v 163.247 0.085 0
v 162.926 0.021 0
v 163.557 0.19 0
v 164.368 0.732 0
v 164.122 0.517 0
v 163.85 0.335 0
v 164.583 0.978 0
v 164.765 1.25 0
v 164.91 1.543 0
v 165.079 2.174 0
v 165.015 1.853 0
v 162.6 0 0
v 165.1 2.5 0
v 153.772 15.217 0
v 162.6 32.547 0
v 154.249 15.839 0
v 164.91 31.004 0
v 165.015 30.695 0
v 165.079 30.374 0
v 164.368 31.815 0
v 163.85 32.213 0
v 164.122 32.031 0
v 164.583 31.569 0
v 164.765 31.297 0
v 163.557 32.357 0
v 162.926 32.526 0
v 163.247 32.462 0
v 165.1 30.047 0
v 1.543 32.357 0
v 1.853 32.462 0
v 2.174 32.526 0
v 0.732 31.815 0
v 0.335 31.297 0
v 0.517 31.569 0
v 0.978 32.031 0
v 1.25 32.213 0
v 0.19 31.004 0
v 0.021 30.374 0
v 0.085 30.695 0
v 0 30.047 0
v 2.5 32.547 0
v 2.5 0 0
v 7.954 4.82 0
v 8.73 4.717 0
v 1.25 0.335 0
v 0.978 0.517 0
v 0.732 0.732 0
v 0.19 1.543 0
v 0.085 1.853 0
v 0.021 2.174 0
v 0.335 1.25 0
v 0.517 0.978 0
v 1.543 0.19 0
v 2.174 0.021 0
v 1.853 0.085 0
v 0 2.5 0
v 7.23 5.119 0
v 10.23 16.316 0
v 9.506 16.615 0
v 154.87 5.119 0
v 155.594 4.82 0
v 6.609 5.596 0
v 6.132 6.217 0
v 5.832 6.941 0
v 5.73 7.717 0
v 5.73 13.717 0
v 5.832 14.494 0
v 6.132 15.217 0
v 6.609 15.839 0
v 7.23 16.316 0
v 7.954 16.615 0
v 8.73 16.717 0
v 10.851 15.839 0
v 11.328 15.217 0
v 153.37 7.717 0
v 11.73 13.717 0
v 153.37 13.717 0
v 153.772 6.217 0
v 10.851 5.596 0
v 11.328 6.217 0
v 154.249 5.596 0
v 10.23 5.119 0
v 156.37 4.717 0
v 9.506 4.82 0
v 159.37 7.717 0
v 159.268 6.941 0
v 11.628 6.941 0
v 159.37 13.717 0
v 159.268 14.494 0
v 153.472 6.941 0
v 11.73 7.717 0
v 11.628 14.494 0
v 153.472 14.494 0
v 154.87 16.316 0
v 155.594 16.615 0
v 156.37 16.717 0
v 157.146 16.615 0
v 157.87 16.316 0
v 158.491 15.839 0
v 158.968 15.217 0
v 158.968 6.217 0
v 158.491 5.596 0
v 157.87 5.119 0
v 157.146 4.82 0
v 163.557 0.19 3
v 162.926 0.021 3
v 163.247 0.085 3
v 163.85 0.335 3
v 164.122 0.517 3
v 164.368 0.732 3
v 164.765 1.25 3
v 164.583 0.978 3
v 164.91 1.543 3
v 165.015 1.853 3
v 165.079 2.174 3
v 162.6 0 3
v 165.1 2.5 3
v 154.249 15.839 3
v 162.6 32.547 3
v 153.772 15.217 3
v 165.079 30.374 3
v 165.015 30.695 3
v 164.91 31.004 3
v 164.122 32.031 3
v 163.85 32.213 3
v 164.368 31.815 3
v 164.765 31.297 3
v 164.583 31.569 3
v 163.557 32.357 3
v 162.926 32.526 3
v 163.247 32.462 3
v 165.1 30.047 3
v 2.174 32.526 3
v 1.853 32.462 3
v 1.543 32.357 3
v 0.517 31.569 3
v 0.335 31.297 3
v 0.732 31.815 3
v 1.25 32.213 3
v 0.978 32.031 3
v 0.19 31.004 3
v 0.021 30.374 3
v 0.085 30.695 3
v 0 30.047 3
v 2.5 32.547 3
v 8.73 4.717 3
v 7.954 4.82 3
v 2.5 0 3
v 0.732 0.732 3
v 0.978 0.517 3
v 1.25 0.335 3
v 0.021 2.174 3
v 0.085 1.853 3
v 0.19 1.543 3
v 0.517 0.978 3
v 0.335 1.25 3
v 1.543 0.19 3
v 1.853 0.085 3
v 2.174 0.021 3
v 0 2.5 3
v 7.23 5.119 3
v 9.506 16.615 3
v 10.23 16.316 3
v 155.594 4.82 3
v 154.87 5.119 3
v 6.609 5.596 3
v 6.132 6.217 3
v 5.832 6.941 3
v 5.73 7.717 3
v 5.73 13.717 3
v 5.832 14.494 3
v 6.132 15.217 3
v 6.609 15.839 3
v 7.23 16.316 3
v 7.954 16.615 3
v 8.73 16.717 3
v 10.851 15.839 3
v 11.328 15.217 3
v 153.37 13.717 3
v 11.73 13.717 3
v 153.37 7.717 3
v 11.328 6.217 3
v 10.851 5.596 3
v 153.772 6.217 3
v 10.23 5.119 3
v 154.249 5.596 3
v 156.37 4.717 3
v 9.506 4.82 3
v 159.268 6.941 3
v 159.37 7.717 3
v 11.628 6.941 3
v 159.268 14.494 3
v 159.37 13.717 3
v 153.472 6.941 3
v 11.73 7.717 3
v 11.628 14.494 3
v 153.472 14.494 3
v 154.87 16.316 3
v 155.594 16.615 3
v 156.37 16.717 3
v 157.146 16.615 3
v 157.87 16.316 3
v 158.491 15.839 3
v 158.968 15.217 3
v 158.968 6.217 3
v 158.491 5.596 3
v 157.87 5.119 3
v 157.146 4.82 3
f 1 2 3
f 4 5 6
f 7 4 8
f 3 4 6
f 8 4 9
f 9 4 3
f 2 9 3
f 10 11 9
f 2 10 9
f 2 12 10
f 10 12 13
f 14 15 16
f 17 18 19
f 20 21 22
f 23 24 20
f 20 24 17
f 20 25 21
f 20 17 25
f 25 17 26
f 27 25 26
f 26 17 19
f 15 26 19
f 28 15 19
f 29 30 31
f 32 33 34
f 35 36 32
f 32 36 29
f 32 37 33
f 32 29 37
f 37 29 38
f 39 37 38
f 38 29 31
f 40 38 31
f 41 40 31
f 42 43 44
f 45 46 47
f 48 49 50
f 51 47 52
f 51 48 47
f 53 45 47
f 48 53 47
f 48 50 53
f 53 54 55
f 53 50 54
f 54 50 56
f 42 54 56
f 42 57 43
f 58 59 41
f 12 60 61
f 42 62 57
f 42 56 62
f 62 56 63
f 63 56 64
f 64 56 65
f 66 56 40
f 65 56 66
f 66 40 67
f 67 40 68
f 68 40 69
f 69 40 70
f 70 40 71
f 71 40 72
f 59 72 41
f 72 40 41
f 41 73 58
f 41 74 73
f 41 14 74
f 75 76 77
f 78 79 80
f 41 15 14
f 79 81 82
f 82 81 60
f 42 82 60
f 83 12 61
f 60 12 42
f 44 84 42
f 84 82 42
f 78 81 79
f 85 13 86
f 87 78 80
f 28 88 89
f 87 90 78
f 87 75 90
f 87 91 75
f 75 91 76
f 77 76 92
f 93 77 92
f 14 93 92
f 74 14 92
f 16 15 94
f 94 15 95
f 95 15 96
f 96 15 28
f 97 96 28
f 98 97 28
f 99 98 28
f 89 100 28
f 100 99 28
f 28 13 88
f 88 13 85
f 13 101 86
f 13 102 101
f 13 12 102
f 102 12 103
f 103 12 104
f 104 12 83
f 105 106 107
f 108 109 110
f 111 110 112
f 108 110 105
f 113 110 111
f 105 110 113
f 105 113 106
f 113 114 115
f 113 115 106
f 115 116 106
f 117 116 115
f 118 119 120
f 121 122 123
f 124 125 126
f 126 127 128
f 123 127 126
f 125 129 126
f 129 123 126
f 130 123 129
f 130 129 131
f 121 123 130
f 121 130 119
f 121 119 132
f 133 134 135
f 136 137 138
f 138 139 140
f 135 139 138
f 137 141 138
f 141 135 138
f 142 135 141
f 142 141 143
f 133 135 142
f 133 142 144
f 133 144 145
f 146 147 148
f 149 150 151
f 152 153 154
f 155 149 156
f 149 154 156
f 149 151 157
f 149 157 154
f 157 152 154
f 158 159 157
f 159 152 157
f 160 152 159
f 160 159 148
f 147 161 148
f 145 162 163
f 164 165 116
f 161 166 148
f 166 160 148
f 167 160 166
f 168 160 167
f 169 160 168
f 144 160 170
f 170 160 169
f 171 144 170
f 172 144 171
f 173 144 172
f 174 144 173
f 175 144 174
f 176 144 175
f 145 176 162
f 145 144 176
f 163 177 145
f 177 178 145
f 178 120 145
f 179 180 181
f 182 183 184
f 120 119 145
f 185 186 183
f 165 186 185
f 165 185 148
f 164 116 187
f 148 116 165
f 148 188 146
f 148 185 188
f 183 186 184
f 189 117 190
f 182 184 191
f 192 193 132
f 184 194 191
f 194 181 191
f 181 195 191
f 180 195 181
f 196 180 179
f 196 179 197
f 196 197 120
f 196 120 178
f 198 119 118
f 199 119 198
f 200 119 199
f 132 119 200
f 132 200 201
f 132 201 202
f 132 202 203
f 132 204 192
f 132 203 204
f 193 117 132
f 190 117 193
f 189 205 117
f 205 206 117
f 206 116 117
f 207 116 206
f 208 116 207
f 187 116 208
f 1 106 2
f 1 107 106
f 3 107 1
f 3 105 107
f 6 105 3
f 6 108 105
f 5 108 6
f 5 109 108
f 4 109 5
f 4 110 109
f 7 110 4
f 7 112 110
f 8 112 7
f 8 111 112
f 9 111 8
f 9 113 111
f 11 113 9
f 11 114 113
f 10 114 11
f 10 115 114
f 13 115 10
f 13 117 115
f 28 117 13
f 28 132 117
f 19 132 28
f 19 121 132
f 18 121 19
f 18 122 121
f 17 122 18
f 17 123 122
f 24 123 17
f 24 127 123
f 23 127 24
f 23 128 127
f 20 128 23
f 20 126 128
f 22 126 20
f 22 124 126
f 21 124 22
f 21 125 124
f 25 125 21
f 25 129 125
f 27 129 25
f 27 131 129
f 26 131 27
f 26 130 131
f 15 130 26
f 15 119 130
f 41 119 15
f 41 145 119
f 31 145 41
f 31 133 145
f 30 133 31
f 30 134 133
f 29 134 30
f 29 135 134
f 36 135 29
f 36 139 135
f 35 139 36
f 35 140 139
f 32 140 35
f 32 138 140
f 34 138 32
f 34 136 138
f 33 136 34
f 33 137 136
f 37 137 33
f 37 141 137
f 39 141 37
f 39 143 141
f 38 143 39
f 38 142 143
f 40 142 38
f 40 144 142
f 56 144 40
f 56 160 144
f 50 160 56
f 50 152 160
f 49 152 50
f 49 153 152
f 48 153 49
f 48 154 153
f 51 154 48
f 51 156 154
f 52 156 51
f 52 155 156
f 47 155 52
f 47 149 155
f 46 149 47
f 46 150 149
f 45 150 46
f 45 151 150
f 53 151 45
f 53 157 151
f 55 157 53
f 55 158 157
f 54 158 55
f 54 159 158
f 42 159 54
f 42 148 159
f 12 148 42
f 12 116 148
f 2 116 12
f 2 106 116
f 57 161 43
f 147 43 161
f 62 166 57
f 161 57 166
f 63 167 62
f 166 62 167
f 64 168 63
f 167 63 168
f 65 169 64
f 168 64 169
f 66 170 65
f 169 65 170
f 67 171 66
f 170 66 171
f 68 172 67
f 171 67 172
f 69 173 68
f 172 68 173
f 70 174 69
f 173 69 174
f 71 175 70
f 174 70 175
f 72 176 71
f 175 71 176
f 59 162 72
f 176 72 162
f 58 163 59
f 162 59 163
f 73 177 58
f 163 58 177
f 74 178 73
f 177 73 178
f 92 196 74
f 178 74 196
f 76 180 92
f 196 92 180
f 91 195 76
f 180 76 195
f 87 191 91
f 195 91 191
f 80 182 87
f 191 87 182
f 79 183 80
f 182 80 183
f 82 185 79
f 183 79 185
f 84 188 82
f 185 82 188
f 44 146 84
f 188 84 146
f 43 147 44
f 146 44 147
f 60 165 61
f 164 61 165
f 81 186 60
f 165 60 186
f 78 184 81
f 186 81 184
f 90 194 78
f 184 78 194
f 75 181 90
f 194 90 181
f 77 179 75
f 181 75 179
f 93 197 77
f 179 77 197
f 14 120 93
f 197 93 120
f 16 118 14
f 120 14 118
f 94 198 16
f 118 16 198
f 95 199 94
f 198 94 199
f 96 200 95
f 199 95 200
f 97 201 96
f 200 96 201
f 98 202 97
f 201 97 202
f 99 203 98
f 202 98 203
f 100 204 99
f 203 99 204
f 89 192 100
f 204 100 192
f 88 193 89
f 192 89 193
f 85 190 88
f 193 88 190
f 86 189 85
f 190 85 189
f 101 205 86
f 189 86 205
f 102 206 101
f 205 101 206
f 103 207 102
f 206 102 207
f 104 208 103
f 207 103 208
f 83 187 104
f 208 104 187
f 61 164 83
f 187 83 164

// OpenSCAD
/**
 * OpenSCAD Rack Plate Library
 * 
 * Conforms to standards defined in Wikipedia for Rack Units (19-inch racks).
 * Formula for height: h = 44.45 * n - 0.79 (mm)
 * Standard mounting width: 465.14 mm (center-to-center)
 */

// --- Default Values ---
DEFAULT_U_COUNT = 1;
DEFAULT_THICKNESS = 3;
DEFAULT_WIDTH_INCHES = 6.5;
DEFAULT_CORNER_RADIUS = 2.5;
DEFAULT_HOLE_DIAMETER = 6;
DEFAULT_SLOT_LENGTH = 12; // At least twice the diameter (6mm * 2)

// --- Modules ---

/**
 * Generates a rack plate.
 * 
 * @param u_count Number of rack units (n)
 * @param thickness Plate thickness in mm
 * @param width_inches Nominal width of the rack in inches (default 19)
 * @param corner_radius Radius for the outer corners in mm
 * @param hole_diameter Diameter of the mounting holes in mm
 * @param slot_length Total length of the oblong mounting holes in mm
 */
module rack_plate(
    u_count         = DEFAULT_U_COUNT,
    thickness       = DEFAULT_THICKNESS,
    width_inches    = DEFAULT_WIDTH_INCHES,
    corner_radius   = DEFAULT_CORNER_RADIUS,
    hole_diameter   = DEFAULT_HOLE_DIAMETER,
    slot_length     = DEFAULT_SLOT_LENGTH
) {
    // Requirements validation
    assert(width_inches >= 5.5 && width_inches <= 23, "Width must be between 5.5 and 23 inches");

    // Constants based on requirements
    u_height_mm = 44.45;
    height_offset_mm = 0.79;
    
    // Formula: h = 44.45 * n - 0.79
    total_height = (u_height_mm * u_count) - height_offset_mm;
    
    // 19-inch rack mounting width (center to center)
    // Wikipedia: 18.313 in = 465.14 mm
    standard_mounting_width = 465.14; 
    standard_total_width = 19 * 25.4; // 482.6 mm
    
    // Total width of the plate. 
    total_width = width_inches * 25.4;
    
    // Flange width calculation (distance from edge to mounting hole center)
    // "It is critical that the mounting holes retain their position relative to the adjacent ends of the panel"
    // For a standard 19" rack, the offset from edge to hole center is:
    edge_to_hole_offset = (standard_total_width - standard_mounting_width) / 2;

    linear_extrude(height = thickness) 
    {
        difference() 
        {
            // Main Plate Body with rounded corners
            rounded_rect(total_width, total_height, corner_radius);

            // Mounting Holes
            // "The code should generate flanges with 2 rather than three holes per 1 U of height."
            if (u_count >= 1.0) 
            {
                for (u = [0 : floor(u_count) - 1]) 
                {
                    u_base_y = u * u_height_mm;
                    hole_spacing = 31.75; 
                    y_offset = (u_height_mm - hole_spacing) / 2;
                    
                    y_pos1 = u_base_y + y_offset;
                    y_pos2 = u_base_y + y_offset + hole_spacing;
    
                    // Center holes in the total_height
                    // Since total_height = u_count * 44.45 - 0.79, 
                    // the gaps are at the top and bottom of the stack.
                    // We shift everything by (0.79 / 2) to center it if we consider 
                    // the 0.79 to be distributed.
                    // Actually, the previous code had a formula for center_shift.
                    total_nominal_height = u_height_mm * u_count;
                    center_shift = (total_nominal_height - total_height) / 2;
                    
                    p1 = y_pos1 - center_shift;
                    p2 = y_pos2 - center_shift;
    
                    // Left Holes (Oblong)
                    translate([edge_to_hole_offset, p1])
                    {
                        oblong_hole(hole_diameter, slot_length);
                    }
                    translate([edge_to_hole_offset, p2]) 
                    {
                        oblong_hole(hole_diameter, slot_length);
                    }   
                    // Right Holes (Oblong)
                    translate([total_width - edge_to_hole_offset, p1]) 
                    {
                        oblong_hole(hole_diameter, slot_length);
                    }
                    translate([total_width - edge_to_hole_offset, p2]) 
                    {
                        oblong_hole(hole_diameter, slot_length);
                    }
                }
            }
            else if(u_count < 1.0)
            {
                // There can only be one mounting hole on each side, if any.
                u = 0;
                u_base_y = u * u_height_mm/2;
                hole_spacing = 31.75; 
                y_offset = (u_height_mm - hole_spacing) / 2;
                
                y_pos1 = u_base_y + u_height_mm/4;

                // Center holes in the total_height
                // Since total_height = u_count * 44.45 - 0.79, 
                // the gaps are at the top and bottom of the stack.
                // We shift everything by (0.79 / 2) to center it if we consider 
                // the 0.79 to be distributed.
                // Actually, the previous code had a formula for center_shift.
                total_nominal_height = u_height_mm * u_count;
                center_shift = (total_nominal_height - total_height) / 2;
                
                p1 = y_pos1 - center_shift;

                // Left Holes (Oblong vertical)
                translate([edge_to_hole_offset,  p1])
                {
                    rotate([0, 0, 90])
                    {
                        oblong_hole(hole_diameter, slot_length);
                    }
                }
                    
                // Right Holes (Oblong vertical)
                translate([total_width - edge_to_hole_offset, p1])
                {
                    rotate([0, 0, 90])
                    {
                        oblong_hole(hole_diameter, slot_length);
                    }
                }
            }
        }
    }
}

/**
 * Helper for oblong (slotted) hole
 */
module oblong_hole(d, l) 
{
    hull() 
    {
        translate([-(l - d) / 2, 0]) circle(d = d, $fn = 24);
        translate([(l - d) / 2, 0]) circle(d = d, $fn = 24);
    }
}

/**
 * Helper for rounded rectangle 2D shape
 */
module rounded_rect(w, h, r) 
{
    translate([r, r, 0])
    {
        minkowski() 
        {
            square([w - 2 * r, h - 2 * r]);
            circle(r = r, $fn = 48);
        }
    } 
}

// --- Example Usage ---
// This will render when the file is opened directly in OpenSCAD
// but won't interfere when included in other files.

rack_plate(u_count = 0.75, width_inches= 6.5);
